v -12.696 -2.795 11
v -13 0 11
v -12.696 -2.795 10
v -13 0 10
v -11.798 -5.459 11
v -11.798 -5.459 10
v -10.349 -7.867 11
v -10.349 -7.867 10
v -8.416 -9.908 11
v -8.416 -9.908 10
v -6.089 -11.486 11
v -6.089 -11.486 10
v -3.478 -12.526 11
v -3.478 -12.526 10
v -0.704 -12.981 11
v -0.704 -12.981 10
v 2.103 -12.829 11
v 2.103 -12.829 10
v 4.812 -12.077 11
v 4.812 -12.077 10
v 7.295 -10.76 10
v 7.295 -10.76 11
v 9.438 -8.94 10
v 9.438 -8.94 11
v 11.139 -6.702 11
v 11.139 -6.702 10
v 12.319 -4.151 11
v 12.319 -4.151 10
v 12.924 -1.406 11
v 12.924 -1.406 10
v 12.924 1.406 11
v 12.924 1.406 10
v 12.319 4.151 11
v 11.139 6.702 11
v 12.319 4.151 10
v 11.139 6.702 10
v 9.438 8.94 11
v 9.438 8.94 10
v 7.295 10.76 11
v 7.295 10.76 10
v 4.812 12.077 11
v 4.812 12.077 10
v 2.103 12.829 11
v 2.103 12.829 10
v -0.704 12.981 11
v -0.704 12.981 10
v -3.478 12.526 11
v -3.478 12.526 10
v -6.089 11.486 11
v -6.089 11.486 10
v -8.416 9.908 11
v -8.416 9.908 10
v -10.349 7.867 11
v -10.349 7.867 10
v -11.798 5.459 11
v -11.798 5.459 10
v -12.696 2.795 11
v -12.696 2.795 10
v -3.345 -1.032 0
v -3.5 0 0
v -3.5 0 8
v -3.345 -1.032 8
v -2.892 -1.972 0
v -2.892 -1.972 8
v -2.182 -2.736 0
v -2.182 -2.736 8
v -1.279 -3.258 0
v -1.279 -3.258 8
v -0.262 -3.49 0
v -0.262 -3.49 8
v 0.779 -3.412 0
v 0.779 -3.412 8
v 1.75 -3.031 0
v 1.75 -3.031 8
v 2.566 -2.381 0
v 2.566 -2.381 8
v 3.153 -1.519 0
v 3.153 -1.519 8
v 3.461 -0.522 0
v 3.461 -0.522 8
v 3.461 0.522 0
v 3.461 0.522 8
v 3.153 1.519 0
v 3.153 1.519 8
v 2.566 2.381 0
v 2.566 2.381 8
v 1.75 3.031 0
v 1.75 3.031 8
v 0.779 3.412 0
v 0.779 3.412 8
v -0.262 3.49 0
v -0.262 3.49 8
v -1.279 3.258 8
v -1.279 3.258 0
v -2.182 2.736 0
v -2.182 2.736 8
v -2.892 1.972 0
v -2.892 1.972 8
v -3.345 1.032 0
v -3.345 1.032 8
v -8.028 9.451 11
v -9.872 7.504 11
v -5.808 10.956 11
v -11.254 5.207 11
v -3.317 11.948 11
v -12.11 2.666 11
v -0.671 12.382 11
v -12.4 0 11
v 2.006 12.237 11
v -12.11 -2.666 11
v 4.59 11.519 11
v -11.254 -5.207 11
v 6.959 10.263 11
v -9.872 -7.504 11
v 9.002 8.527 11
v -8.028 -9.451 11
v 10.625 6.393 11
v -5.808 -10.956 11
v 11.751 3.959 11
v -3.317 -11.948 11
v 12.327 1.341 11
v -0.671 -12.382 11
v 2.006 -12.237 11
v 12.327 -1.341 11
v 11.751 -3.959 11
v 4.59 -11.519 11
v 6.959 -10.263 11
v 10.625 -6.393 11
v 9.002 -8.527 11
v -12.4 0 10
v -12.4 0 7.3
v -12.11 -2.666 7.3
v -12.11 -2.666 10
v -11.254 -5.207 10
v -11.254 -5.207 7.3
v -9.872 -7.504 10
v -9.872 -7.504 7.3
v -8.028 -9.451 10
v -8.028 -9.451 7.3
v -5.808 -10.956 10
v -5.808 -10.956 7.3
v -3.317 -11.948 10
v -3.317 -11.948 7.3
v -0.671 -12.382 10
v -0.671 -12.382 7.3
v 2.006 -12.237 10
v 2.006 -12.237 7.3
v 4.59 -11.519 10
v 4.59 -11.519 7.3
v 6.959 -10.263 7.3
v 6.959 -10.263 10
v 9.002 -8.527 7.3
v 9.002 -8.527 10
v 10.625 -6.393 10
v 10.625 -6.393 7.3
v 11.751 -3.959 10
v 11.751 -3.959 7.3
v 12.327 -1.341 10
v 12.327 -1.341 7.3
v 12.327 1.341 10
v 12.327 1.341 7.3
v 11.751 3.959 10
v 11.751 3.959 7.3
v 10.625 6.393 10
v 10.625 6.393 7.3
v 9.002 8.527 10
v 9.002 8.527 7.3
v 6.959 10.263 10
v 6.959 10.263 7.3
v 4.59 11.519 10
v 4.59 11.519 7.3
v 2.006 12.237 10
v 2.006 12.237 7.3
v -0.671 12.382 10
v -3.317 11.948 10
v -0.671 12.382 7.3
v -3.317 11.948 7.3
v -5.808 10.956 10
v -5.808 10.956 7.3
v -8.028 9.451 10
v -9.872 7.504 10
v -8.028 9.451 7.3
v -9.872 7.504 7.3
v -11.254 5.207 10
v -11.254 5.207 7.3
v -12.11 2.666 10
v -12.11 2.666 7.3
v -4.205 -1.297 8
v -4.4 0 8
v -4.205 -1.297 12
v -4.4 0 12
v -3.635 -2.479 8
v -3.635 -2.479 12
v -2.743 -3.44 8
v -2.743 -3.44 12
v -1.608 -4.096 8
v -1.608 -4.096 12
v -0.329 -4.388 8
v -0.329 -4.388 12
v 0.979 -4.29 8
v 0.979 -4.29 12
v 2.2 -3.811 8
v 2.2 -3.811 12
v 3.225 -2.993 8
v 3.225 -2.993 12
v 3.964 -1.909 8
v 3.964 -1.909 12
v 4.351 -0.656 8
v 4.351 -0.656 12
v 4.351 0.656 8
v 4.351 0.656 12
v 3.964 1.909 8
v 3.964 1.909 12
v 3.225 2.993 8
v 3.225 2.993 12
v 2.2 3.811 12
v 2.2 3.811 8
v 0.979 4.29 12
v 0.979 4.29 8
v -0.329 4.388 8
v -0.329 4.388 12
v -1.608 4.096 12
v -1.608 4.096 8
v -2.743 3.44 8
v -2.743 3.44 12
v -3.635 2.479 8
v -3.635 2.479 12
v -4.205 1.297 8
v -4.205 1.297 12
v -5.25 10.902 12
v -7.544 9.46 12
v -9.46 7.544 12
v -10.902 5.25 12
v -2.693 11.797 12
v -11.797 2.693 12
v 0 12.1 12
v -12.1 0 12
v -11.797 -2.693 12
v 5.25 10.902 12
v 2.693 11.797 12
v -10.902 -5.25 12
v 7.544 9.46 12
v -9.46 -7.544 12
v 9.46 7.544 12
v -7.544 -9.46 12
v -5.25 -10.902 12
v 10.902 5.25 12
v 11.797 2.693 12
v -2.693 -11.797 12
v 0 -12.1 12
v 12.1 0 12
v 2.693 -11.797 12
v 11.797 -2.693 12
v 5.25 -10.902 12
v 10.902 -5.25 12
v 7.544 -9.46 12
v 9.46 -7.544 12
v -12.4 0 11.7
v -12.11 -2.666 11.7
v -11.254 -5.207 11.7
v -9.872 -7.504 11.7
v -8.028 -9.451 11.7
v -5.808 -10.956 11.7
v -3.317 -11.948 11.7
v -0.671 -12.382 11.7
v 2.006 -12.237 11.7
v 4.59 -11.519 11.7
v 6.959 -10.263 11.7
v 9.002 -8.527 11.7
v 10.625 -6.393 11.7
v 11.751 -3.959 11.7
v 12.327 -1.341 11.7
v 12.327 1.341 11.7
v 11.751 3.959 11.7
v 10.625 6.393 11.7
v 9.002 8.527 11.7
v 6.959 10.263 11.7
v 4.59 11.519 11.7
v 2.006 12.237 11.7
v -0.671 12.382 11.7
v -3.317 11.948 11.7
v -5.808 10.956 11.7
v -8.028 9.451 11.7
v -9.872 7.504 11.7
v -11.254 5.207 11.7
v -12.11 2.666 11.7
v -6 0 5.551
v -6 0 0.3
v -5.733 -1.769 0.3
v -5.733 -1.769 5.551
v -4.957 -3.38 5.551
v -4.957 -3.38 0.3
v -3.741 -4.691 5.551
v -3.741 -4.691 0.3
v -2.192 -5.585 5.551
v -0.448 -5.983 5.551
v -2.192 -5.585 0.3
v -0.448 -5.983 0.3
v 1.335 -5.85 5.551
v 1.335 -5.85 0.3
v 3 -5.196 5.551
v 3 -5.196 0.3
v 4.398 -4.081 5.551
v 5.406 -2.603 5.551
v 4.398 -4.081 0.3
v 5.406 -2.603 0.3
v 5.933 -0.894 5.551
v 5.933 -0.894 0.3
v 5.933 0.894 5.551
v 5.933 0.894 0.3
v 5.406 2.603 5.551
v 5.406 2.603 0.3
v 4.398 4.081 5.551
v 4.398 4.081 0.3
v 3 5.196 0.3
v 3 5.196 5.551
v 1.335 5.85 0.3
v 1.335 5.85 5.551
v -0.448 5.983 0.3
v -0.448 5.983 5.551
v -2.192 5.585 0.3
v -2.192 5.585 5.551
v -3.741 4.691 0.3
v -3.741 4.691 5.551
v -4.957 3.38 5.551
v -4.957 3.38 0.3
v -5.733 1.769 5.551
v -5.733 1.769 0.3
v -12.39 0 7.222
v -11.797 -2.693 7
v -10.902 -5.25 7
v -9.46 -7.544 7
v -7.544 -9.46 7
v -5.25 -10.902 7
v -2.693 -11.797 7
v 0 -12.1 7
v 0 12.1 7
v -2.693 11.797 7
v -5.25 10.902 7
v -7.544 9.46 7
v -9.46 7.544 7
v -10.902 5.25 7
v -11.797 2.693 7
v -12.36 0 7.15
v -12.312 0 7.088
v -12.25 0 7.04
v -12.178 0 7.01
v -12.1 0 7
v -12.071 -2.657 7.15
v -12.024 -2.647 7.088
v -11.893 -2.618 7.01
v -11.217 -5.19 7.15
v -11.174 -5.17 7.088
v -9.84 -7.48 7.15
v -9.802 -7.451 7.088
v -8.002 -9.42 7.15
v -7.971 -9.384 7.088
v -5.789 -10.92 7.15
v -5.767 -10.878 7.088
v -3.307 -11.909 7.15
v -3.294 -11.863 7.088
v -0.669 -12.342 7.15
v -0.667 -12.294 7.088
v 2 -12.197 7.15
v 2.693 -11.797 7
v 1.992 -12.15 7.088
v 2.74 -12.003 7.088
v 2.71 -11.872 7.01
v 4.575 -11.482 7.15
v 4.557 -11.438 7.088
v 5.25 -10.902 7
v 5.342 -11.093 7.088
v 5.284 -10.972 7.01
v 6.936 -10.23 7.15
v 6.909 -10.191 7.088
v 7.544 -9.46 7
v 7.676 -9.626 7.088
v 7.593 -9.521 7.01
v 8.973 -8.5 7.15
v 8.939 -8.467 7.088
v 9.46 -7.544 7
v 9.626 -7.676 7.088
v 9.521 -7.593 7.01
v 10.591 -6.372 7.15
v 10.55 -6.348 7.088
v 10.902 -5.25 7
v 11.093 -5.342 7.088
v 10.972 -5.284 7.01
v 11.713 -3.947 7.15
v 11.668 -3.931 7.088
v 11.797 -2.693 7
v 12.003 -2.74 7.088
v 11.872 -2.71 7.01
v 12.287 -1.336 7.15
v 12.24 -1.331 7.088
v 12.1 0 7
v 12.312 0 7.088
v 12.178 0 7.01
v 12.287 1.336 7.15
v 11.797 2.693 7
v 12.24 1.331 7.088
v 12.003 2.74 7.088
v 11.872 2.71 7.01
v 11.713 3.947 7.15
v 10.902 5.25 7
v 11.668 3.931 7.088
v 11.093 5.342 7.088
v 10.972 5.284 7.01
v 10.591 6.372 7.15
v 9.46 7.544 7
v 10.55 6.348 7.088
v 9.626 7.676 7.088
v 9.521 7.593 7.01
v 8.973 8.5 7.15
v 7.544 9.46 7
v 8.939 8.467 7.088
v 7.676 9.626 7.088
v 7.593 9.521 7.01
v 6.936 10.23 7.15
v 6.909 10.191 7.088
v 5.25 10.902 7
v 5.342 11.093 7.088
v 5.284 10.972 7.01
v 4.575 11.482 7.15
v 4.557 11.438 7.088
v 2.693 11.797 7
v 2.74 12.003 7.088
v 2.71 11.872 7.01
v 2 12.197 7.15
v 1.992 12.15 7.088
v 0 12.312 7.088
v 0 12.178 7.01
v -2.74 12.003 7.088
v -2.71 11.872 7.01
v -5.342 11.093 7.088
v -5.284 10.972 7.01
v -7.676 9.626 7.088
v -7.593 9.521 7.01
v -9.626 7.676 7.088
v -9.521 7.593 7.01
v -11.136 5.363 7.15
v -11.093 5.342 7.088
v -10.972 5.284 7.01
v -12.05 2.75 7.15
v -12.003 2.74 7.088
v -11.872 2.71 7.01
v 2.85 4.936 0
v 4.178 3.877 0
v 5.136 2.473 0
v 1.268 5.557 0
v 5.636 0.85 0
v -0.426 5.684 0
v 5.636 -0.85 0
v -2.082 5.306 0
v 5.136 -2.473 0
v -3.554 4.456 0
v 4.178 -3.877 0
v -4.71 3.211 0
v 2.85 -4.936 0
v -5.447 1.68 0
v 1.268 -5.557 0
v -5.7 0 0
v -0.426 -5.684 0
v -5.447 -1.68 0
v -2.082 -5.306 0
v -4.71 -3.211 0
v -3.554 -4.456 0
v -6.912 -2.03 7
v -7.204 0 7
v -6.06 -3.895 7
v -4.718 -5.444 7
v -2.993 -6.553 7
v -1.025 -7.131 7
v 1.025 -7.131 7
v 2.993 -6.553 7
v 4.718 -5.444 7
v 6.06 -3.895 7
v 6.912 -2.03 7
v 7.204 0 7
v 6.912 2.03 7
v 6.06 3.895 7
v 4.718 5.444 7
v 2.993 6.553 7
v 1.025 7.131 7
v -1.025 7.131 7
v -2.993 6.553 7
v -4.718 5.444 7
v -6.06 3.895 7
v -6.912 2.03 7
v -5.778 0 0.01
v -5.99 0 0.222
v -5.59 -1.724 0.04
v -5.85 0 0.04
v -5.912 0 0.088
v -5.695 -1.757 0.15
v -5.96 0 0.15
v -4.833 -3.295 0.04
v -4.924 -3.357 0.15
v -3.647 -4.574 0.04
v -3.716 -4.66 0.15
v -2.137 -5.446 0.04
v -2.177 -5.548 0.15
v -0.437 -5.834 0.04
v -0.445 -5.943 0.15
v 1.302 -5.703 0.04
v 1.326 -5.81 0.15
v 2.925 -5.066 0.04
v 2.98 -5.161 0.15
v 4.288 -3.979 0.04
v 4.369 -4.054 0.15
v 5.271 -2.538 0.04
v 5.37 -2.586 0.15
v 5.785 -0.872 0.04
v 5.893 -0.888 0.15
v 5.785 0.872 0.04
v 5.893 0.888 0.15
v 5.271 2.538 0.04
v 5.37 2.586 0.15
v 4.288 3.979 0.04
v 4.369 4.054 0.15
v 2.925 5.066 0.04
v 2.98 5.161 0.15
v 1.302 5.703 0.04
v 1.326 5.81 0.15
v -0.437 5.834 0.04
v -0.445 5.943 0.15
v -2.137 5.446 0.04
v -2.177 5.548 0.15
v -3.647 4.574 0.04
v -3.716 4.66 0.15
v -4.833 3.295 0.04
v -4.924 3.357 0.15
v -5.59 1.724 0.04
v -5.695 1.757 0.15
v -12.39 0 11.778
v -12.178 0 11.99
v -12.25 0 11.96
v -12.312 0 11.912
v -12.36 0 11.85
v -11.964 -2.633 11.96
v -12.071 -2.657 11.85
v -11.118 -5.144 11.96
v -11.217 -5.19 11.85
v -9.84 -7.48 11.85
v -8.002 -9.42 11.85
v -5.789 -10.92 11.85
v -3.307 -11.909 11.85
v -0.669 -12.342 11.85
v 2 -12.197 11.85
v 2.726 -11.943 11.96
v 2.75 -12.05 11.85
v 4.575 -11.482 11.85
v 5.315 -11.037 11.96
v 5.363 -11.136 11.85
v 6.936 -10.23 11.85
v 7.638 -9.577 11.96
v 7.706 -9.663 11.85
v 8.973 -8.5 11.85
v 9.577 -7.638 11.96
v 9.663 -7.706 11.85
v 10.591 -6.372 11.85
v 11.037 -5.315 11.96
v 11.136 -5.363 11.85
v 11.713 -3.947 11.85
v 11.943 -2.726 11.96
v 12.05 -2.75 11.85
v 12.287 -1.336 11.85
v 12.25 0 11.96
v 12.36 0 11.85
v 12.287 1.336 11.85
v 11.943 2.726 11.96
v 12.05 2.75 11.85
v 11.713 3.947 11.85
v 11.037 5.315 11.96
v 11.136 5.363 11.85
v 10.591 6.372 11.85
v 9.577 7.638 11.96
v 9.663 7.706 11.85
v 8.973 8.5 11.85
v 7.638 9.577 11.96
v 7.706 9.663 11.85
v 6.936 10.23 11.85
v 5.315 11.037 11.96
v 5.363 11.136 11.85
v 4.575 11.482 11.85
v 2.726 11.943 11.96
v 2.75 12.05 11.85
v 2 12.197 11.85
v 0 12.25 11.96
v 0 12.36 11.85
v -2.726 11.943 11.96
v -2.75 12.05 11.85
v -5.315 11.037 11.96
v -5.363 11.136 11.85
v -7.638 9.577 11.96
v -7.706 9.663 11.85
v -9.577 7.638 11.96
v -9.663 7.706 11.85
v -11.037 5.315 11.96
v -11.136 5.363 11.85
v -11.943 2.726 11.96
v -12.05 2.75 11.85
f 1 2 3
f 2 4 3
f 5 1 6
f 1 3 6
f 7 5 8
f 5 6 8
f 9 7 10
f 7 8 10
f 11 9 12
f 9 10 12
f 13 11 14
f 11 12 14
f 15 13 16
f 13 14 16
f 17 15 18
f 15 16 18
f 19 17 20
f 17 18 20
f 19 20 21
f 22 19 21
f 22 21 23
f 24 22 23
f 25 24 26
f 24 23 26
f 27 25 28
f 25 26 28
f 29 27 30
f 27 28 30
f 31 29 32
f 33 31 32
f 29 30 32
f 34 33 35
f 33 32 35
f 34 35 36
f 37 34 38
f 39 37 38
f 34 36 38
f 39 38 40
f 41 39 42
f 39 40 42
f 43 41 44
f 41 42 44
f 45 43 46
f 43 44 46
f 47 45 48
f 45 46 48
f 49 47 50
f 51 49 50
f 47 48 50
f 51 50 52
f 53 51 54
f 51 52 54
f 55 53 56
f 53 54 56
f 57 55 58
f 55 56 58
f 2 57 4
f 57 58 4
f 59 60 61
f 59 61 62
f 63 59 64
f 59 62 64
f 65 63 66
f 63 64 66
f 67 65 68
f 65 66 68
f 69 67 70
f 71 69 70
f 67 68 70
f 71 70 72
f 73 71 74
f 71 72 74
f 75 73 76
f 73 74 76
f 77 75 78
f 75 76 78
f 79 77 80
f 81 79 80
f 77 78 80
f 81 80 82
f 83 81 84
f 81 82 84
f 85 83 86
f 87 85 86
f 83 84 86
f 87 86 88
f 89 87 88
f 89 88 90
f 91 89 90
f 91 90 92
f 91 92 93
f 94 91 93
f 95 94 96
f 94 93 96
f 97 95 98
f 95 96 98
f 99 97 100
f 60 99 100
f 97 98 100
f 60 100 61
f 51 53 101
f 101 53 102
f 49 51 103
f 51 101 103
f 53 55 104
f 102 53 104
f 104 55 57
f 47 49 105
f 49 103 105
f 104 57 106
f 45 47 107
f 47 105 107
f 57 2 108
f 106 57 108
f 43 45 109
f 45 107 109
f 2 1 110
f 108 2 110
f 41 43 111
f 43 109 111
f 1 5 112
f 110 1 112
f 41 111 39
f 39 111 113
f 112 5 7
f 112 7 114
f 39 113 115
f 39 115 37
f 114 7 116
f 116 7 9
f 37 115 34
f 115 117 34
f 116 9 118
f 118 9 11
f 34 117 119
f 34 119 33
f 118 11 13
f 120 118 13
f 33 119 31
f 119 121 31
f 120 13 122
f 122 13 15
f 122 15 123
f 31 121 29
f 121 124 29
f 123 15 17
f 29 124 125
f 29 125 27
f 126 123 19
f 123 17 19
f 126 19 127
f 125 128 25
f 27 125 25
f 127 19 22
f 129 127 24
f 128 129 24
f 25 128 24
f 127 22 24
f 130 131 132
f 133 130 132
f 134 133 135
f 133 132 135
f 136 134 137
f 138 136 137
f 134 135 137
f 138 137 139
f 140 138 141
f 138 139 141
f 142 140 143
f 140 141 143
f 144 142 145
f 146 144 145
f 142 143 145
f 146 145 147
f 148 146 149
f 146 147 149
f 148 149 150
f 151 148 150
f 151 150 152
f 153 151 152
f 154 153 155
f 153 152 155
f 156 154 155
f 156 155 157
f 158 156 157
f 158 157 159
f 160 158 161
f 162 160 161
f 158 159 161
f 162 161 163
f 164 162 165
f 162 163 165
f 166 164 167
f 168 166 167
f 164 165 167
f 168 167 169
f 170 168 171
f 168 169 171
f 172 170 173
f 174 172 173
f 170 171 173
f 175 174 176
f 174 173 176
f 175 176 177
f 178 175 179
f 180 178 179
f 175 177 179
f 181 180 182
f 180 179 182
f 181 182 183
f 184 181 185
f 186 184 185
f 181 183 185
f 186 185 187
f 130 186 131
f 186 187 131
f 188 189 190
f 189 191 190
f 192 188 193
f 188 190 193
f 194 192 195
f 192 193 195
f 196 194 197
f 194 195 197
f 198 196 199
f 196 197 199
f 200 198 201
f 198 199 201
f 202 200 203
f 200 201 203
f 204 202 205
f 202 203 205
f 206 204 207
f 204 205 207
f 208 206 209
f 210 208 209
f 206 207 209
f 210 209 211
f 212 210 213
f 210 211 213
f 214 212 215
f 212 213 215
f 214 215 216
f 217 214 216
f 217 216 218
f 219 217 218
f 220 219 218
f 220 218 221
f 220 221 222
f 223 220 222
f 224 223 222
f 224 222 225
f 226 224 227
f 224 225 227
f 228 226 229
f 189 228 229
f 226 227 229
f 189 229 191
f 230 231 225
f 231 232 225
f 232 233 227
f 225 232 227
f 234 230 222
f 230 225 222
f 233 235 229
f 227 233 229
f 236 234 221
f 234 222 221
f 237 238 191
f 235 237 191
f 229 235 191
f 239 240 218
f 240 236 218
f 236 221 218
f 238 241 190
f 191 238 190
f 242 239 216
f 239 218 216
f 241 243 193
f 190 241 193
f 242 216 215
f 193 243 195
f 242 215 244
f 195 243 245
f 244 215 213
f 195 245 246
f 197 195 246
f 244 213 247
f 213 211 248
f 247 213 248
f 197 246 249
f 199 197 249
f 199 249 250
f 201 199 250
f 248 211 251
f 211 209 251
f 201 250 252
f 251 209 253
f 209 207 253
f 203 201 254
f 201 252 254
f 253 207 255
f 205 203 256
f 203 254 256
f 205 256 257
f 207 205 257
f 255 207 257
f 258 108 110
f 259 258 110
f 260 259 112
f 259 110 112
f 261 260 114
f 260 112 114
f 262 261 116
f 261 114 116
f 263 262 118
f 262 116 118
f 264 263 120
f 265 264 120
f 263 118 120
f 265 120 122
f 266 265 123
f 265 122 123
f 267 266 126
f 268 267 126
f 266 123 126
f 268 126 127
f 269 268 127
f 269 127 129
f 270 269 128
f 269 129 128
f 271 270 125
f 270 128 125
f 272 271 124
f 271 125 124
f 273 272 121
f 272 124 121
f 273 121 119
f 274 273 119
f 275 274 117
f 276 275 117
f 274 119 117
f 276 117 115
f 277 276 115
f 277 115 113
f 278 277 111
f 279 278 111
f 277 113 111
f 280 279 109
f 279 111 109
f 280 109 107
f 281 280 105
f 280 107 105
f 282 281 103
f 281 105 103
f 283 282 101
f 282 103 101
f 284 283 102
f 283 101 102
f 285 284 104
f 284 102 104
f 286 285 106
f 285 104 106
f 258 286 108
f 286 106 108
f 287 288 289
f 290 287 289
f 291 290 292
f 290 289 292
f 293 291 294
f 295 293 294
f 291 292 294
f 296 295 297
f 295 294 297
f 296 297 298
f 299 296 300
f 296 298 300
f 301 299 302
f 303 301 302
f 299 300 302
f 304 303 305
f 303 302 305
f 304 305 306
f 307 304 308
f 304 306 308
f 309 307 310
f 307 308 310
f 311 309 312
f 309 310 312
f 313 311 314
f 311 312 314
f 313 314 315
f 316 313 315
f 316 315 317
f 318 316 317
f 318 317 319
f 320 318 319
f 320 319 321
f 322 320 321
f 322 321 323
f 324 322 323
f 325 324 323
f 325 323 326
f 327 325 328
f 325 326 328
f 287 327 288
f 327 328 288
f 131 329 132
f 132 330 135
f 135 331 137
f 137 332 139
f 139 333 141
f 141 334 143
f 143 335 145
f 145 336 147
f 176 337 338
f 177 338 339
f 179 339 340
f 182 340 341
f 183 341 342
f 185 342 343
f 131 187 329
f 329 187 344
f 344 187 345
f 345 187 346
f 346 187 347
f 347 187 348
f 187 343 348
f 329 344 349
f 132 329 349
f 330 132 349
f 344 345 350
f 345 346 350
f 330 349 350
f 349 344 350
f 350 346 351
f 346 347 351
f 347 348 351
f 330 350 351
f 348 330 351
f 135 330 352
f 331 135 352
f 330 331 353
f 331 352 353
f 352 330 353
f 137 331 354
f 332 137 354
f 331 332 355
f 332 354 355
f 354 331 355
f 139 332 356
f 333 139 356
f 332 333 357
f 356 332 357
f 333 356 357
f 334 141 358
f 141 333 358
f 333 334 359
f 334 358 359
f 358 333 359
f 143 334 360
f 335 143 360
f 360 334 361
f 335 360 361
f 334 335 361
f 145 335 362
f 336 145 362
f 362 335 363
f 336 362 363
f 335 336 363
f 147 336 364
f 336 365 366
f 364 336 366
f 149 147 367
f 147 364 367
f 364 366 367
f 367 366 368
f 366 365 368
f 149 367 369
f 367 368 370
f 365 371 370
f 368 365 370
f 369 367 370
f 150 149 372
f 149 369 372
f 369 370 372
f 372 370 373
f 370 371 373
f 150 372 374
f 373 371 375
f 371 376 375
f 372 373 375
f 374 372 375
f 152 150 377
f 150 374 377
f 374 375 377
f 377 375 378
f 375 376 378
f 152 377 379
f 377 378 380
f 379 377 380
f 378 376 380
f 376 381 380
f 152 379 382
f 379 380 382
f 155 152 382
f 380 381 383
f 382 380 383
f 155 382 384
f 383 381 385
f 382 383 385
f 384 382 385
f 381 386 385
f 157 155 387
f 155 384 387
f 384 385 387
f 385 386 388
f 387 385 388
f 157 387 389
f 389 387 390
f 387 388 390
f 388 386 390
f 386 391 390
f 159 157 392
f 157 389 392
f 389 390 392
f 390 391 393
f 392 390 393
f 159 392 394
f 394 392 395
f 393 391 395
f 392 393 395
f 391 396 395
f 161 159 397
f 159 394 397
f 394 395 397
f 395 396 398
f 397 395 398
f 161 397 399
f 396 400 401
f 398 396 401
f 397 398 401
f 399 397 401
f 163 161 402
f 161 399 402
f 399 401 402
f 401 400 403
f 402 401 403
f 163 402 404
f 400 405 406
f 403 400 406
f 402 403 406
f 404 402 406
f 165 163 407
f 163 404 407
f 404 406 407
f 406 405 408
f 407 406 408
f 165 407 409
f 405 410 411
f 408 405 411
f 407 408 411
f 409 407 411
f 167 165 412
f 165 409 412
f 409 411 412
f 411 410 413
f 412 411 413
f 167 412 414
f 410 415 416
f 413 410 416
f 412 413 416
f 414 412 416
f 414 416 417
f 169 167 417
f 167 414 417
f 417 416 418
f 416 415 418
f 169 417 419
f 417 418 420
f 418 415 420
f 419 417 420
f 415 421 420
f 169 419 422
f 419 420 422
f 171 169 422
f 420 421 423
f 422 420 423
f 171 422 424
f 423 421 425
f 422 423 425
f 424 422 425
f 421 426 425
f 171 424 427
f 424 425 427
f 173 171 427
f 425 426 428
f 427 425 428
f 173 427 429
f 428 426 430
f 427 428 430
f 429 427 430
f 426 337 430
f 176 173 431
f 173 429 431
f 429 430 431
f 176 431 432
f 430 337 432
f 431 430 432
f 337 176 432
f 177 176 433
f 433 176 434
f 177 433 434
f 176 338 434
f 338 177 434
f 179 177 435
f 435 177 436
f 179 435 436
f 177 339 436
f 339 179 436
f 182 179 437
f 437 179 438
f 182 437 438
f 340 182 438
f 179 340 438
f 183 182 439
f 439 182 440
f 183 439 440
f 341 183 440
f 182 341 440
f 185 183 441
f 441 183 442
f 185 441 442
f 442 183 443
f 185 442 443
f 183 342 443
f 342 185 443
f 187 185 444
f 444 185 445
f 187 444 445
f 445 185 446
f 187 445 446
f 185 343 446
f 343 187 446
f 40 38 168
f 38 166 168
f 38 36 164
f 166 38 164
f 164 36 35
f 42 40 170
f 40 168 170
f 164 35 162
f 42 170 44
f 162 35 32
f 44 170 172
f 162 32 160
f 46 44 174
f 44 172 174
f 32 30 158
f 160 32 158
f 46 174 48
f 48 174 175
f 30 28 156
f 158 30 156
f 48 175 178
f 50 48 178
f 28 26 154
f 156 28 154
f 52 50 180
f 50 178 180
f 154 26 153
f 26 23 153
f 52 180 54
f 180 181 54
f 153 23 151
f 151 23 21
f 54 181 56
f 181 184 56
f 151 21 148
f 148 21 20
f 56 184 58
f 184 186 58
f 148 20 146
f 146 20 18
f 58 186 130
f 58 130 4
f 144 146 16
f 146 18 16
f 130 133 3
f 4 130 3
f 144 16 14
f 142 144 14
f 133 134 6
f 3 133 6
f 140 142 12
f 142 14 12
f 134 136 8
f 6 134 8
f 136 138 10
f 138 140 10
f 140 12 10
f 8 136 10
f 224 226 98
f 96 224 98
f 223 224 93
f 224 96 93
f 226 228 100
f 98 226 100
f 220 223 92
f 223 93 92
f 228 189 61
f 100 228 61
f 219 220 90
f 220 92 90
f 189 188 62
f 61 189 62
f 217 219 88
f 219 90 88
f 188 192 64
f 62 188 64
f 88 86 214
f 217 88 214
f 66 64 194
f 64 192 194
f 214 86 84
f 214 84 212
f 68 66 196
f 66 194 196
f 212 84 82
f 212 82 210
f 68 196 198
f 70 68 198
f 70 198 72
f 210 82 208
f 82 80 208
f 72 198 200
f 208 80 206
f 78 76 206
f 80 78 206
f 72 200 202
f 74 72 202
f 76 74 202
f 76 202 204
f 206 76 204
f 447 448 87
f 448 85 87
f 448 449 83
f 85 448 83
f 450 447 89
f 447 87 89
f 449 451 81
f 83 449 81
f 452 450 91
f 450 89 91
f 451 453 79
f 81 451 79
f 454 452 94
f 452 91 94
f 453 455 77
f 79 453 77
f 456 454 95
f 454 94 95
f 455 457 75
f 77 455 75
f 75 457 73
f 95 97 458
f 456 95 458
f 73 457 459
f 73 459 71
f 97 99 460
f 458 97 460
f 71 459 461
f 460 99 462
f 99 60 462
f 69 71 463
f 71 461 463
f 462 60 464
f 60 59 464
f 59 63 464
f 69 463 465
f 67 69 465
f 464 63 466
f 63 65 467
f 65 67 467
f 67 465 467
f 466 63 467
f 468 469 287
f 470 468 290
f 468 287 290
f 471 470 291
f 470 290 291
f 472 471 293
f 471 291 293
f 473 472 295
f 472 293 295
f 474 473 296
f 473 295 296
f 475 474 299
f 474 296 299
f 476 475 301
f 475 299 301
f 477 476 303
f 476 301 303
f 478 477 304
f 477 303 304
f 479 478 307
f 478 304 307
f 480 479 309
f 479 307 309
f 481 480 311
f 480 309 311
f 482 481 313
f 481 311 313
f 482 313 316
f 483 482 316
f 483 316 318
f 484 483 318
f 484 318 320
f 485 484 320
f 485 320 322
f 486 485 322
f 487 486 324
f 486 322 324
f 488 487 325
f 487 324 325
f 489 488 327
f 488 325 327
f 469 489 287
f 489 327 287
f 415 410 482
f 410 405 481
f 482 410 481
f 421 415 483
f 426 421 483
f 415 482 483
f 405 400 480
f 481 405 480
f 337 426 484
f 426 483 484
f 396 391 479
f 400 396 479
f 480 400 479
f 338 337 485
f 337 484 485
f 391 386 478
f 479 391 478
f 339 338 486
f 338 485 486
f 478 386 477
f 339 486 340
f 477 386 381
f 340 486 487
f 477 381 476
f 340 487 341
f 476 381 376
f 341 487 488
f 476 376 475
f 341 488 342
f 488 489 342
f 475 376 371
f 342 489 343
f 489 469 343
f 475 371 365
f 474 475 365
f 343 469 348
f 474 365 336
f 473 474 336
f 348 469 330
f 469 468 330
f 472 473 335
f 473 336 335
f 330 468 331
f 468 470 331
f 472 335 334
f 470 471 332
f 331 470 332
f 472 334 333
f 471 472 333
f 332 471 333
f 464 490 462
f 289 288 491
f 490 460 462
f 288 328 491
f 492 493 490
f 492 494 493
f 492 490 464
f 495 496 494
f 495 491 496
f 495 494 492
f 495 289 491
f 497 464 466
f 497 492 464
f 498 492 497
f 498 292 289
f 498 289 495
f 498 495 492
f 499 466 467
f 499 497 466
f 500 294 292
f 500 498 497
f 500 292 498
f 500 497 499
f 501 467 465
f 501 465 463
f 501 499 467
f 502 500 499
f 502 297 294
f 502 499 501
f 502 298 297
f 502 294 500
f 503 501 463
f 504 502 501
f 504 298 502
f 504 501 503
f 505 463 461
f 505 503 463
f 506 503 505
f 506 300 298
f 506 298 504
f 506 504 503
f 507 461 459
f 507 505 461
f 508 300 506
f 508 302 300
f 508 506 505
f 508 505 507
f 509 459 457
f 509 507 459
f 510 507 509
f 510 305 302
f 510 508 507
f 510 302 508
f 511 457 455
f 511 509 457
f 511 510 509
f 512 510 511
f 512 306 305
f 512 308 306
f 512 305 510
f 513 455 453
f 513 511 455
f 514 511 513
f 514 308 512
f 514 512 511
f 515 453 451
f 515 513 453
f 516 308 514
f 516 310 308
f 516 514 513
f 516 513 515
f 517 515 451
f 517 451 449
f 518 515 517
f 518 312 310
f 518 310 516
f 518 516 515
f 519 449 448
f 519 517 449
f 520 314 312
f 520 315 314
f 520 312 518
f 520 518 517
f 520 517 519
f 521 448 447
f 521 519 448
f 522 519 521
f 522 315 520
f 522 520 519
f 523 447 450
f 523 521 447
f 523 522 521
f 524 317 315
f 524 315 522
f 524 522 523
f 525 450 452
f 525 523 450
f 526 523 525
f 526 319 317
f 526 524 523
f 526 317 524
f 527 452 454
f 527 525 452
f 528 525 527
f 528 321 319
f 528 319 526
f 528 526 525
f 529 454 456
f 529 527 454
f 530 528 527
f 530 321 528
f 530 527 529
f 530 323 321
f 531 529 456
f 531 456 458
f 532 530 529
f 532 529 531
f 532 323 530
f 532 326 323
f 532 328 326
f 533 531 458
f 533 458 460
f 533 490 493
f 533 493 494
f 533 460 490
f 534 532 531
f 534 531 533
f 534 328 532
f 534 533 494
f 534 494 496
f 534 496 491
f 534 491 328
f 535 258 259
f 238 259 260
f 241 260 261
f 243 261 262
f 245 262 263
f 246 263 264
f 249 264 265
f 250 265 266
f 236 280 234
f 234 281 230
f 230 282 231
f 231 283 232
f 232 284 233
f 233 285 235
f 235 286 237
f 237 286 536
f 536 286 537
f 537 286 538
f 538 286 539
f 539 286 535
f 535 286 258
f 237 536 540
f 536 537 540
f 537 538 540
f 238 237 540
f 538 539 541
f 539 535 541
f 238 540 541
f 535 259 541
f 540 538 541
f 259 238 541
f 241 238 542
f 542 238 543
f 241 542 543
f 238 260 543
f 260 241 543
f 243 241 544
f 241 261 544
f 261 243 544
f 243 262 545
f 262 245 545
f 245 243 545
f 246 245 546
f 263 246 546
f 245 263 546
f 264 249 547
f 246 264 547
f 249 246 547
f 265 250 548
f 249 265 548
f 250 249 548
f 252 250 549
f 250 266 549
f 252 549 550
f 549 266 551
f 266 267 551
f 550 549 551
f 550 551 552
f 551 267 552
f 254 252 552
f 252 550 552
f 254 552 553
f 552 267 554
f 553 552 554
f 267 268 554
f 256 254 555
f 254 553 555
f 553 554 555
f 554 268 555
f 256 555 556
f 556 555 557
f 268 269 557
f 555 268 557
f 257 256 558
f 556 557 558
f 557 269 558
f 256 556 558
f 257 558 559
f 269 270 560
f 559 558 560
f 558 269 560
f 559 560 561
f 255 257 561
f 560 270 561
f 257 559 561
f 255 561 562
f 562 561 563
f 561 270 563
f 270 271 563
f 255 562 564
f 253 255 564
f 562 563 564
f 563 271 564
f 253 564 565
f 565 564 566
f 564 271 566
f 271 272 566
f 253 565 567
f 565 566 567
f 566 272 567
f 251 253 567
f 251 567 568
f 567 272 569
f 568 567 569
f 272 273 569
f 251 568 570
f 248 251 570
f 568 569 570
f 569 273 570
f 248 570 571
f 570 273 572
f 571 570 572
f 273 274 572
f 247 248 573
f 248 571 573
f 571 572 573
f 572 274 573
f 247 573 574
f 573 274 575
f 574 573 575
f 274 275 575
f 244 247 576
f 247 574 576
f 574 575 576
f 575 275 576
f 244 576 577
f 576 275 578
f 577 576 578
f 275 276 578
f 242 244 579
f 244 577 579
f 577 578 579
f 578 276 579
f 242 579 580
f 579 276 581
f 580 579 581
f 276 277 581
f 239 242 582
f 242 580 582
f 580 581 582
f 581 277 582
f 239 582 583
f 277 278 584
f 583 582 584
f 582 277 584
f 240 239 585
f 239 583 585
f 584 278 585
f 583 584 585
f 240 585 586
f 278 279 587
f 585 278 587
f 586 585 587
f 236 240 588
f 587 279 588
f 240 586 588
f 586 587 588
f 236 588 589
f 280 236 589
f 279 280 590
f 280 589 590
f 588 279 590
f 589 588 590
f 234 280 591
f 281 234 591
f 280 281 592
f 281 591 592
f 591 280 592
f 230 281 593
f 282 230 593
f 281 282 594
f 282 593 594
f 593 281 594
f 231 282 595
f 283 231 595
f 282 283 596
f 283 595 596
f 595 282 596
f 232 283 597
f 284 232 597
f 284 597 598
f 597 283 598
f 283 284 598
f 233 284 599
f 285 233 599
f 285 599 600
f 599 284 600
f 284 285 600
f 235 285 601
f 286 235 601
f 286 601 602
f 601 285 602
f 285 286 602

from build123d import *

# Parameters (mm, degrees)
F2_R = 0.3


with BuildPart() as f1:
    # F0 (on Front) → F1 (revolve)
    with BuildSketch(Plane.XZ):
        Polygon((-6, 0), (-3.5, 0), (-3.5, 8.000001), (-4.4, 8.000001), (-4.4, 12), (-12.4, 12), (-12.4, 11), (-13, 11), (-13, 10), (-12.4, 10), (-12.4, 7), (-7.203946, 7), (-6, 5.550987), align=None)
    revolve(axis=Axis((0, 0, 7.469198), (0, 0, 1)))

    # F2
    f2_edges = [f1.edges().sort_by_distance(p)[0] for p in [
        (12.4, 0, 12),
        (12.4, 0, 7),
        (6, 0, 0),
    ]]
    fillet(f2_edges, radius=F2_R)


solid = f1.part
